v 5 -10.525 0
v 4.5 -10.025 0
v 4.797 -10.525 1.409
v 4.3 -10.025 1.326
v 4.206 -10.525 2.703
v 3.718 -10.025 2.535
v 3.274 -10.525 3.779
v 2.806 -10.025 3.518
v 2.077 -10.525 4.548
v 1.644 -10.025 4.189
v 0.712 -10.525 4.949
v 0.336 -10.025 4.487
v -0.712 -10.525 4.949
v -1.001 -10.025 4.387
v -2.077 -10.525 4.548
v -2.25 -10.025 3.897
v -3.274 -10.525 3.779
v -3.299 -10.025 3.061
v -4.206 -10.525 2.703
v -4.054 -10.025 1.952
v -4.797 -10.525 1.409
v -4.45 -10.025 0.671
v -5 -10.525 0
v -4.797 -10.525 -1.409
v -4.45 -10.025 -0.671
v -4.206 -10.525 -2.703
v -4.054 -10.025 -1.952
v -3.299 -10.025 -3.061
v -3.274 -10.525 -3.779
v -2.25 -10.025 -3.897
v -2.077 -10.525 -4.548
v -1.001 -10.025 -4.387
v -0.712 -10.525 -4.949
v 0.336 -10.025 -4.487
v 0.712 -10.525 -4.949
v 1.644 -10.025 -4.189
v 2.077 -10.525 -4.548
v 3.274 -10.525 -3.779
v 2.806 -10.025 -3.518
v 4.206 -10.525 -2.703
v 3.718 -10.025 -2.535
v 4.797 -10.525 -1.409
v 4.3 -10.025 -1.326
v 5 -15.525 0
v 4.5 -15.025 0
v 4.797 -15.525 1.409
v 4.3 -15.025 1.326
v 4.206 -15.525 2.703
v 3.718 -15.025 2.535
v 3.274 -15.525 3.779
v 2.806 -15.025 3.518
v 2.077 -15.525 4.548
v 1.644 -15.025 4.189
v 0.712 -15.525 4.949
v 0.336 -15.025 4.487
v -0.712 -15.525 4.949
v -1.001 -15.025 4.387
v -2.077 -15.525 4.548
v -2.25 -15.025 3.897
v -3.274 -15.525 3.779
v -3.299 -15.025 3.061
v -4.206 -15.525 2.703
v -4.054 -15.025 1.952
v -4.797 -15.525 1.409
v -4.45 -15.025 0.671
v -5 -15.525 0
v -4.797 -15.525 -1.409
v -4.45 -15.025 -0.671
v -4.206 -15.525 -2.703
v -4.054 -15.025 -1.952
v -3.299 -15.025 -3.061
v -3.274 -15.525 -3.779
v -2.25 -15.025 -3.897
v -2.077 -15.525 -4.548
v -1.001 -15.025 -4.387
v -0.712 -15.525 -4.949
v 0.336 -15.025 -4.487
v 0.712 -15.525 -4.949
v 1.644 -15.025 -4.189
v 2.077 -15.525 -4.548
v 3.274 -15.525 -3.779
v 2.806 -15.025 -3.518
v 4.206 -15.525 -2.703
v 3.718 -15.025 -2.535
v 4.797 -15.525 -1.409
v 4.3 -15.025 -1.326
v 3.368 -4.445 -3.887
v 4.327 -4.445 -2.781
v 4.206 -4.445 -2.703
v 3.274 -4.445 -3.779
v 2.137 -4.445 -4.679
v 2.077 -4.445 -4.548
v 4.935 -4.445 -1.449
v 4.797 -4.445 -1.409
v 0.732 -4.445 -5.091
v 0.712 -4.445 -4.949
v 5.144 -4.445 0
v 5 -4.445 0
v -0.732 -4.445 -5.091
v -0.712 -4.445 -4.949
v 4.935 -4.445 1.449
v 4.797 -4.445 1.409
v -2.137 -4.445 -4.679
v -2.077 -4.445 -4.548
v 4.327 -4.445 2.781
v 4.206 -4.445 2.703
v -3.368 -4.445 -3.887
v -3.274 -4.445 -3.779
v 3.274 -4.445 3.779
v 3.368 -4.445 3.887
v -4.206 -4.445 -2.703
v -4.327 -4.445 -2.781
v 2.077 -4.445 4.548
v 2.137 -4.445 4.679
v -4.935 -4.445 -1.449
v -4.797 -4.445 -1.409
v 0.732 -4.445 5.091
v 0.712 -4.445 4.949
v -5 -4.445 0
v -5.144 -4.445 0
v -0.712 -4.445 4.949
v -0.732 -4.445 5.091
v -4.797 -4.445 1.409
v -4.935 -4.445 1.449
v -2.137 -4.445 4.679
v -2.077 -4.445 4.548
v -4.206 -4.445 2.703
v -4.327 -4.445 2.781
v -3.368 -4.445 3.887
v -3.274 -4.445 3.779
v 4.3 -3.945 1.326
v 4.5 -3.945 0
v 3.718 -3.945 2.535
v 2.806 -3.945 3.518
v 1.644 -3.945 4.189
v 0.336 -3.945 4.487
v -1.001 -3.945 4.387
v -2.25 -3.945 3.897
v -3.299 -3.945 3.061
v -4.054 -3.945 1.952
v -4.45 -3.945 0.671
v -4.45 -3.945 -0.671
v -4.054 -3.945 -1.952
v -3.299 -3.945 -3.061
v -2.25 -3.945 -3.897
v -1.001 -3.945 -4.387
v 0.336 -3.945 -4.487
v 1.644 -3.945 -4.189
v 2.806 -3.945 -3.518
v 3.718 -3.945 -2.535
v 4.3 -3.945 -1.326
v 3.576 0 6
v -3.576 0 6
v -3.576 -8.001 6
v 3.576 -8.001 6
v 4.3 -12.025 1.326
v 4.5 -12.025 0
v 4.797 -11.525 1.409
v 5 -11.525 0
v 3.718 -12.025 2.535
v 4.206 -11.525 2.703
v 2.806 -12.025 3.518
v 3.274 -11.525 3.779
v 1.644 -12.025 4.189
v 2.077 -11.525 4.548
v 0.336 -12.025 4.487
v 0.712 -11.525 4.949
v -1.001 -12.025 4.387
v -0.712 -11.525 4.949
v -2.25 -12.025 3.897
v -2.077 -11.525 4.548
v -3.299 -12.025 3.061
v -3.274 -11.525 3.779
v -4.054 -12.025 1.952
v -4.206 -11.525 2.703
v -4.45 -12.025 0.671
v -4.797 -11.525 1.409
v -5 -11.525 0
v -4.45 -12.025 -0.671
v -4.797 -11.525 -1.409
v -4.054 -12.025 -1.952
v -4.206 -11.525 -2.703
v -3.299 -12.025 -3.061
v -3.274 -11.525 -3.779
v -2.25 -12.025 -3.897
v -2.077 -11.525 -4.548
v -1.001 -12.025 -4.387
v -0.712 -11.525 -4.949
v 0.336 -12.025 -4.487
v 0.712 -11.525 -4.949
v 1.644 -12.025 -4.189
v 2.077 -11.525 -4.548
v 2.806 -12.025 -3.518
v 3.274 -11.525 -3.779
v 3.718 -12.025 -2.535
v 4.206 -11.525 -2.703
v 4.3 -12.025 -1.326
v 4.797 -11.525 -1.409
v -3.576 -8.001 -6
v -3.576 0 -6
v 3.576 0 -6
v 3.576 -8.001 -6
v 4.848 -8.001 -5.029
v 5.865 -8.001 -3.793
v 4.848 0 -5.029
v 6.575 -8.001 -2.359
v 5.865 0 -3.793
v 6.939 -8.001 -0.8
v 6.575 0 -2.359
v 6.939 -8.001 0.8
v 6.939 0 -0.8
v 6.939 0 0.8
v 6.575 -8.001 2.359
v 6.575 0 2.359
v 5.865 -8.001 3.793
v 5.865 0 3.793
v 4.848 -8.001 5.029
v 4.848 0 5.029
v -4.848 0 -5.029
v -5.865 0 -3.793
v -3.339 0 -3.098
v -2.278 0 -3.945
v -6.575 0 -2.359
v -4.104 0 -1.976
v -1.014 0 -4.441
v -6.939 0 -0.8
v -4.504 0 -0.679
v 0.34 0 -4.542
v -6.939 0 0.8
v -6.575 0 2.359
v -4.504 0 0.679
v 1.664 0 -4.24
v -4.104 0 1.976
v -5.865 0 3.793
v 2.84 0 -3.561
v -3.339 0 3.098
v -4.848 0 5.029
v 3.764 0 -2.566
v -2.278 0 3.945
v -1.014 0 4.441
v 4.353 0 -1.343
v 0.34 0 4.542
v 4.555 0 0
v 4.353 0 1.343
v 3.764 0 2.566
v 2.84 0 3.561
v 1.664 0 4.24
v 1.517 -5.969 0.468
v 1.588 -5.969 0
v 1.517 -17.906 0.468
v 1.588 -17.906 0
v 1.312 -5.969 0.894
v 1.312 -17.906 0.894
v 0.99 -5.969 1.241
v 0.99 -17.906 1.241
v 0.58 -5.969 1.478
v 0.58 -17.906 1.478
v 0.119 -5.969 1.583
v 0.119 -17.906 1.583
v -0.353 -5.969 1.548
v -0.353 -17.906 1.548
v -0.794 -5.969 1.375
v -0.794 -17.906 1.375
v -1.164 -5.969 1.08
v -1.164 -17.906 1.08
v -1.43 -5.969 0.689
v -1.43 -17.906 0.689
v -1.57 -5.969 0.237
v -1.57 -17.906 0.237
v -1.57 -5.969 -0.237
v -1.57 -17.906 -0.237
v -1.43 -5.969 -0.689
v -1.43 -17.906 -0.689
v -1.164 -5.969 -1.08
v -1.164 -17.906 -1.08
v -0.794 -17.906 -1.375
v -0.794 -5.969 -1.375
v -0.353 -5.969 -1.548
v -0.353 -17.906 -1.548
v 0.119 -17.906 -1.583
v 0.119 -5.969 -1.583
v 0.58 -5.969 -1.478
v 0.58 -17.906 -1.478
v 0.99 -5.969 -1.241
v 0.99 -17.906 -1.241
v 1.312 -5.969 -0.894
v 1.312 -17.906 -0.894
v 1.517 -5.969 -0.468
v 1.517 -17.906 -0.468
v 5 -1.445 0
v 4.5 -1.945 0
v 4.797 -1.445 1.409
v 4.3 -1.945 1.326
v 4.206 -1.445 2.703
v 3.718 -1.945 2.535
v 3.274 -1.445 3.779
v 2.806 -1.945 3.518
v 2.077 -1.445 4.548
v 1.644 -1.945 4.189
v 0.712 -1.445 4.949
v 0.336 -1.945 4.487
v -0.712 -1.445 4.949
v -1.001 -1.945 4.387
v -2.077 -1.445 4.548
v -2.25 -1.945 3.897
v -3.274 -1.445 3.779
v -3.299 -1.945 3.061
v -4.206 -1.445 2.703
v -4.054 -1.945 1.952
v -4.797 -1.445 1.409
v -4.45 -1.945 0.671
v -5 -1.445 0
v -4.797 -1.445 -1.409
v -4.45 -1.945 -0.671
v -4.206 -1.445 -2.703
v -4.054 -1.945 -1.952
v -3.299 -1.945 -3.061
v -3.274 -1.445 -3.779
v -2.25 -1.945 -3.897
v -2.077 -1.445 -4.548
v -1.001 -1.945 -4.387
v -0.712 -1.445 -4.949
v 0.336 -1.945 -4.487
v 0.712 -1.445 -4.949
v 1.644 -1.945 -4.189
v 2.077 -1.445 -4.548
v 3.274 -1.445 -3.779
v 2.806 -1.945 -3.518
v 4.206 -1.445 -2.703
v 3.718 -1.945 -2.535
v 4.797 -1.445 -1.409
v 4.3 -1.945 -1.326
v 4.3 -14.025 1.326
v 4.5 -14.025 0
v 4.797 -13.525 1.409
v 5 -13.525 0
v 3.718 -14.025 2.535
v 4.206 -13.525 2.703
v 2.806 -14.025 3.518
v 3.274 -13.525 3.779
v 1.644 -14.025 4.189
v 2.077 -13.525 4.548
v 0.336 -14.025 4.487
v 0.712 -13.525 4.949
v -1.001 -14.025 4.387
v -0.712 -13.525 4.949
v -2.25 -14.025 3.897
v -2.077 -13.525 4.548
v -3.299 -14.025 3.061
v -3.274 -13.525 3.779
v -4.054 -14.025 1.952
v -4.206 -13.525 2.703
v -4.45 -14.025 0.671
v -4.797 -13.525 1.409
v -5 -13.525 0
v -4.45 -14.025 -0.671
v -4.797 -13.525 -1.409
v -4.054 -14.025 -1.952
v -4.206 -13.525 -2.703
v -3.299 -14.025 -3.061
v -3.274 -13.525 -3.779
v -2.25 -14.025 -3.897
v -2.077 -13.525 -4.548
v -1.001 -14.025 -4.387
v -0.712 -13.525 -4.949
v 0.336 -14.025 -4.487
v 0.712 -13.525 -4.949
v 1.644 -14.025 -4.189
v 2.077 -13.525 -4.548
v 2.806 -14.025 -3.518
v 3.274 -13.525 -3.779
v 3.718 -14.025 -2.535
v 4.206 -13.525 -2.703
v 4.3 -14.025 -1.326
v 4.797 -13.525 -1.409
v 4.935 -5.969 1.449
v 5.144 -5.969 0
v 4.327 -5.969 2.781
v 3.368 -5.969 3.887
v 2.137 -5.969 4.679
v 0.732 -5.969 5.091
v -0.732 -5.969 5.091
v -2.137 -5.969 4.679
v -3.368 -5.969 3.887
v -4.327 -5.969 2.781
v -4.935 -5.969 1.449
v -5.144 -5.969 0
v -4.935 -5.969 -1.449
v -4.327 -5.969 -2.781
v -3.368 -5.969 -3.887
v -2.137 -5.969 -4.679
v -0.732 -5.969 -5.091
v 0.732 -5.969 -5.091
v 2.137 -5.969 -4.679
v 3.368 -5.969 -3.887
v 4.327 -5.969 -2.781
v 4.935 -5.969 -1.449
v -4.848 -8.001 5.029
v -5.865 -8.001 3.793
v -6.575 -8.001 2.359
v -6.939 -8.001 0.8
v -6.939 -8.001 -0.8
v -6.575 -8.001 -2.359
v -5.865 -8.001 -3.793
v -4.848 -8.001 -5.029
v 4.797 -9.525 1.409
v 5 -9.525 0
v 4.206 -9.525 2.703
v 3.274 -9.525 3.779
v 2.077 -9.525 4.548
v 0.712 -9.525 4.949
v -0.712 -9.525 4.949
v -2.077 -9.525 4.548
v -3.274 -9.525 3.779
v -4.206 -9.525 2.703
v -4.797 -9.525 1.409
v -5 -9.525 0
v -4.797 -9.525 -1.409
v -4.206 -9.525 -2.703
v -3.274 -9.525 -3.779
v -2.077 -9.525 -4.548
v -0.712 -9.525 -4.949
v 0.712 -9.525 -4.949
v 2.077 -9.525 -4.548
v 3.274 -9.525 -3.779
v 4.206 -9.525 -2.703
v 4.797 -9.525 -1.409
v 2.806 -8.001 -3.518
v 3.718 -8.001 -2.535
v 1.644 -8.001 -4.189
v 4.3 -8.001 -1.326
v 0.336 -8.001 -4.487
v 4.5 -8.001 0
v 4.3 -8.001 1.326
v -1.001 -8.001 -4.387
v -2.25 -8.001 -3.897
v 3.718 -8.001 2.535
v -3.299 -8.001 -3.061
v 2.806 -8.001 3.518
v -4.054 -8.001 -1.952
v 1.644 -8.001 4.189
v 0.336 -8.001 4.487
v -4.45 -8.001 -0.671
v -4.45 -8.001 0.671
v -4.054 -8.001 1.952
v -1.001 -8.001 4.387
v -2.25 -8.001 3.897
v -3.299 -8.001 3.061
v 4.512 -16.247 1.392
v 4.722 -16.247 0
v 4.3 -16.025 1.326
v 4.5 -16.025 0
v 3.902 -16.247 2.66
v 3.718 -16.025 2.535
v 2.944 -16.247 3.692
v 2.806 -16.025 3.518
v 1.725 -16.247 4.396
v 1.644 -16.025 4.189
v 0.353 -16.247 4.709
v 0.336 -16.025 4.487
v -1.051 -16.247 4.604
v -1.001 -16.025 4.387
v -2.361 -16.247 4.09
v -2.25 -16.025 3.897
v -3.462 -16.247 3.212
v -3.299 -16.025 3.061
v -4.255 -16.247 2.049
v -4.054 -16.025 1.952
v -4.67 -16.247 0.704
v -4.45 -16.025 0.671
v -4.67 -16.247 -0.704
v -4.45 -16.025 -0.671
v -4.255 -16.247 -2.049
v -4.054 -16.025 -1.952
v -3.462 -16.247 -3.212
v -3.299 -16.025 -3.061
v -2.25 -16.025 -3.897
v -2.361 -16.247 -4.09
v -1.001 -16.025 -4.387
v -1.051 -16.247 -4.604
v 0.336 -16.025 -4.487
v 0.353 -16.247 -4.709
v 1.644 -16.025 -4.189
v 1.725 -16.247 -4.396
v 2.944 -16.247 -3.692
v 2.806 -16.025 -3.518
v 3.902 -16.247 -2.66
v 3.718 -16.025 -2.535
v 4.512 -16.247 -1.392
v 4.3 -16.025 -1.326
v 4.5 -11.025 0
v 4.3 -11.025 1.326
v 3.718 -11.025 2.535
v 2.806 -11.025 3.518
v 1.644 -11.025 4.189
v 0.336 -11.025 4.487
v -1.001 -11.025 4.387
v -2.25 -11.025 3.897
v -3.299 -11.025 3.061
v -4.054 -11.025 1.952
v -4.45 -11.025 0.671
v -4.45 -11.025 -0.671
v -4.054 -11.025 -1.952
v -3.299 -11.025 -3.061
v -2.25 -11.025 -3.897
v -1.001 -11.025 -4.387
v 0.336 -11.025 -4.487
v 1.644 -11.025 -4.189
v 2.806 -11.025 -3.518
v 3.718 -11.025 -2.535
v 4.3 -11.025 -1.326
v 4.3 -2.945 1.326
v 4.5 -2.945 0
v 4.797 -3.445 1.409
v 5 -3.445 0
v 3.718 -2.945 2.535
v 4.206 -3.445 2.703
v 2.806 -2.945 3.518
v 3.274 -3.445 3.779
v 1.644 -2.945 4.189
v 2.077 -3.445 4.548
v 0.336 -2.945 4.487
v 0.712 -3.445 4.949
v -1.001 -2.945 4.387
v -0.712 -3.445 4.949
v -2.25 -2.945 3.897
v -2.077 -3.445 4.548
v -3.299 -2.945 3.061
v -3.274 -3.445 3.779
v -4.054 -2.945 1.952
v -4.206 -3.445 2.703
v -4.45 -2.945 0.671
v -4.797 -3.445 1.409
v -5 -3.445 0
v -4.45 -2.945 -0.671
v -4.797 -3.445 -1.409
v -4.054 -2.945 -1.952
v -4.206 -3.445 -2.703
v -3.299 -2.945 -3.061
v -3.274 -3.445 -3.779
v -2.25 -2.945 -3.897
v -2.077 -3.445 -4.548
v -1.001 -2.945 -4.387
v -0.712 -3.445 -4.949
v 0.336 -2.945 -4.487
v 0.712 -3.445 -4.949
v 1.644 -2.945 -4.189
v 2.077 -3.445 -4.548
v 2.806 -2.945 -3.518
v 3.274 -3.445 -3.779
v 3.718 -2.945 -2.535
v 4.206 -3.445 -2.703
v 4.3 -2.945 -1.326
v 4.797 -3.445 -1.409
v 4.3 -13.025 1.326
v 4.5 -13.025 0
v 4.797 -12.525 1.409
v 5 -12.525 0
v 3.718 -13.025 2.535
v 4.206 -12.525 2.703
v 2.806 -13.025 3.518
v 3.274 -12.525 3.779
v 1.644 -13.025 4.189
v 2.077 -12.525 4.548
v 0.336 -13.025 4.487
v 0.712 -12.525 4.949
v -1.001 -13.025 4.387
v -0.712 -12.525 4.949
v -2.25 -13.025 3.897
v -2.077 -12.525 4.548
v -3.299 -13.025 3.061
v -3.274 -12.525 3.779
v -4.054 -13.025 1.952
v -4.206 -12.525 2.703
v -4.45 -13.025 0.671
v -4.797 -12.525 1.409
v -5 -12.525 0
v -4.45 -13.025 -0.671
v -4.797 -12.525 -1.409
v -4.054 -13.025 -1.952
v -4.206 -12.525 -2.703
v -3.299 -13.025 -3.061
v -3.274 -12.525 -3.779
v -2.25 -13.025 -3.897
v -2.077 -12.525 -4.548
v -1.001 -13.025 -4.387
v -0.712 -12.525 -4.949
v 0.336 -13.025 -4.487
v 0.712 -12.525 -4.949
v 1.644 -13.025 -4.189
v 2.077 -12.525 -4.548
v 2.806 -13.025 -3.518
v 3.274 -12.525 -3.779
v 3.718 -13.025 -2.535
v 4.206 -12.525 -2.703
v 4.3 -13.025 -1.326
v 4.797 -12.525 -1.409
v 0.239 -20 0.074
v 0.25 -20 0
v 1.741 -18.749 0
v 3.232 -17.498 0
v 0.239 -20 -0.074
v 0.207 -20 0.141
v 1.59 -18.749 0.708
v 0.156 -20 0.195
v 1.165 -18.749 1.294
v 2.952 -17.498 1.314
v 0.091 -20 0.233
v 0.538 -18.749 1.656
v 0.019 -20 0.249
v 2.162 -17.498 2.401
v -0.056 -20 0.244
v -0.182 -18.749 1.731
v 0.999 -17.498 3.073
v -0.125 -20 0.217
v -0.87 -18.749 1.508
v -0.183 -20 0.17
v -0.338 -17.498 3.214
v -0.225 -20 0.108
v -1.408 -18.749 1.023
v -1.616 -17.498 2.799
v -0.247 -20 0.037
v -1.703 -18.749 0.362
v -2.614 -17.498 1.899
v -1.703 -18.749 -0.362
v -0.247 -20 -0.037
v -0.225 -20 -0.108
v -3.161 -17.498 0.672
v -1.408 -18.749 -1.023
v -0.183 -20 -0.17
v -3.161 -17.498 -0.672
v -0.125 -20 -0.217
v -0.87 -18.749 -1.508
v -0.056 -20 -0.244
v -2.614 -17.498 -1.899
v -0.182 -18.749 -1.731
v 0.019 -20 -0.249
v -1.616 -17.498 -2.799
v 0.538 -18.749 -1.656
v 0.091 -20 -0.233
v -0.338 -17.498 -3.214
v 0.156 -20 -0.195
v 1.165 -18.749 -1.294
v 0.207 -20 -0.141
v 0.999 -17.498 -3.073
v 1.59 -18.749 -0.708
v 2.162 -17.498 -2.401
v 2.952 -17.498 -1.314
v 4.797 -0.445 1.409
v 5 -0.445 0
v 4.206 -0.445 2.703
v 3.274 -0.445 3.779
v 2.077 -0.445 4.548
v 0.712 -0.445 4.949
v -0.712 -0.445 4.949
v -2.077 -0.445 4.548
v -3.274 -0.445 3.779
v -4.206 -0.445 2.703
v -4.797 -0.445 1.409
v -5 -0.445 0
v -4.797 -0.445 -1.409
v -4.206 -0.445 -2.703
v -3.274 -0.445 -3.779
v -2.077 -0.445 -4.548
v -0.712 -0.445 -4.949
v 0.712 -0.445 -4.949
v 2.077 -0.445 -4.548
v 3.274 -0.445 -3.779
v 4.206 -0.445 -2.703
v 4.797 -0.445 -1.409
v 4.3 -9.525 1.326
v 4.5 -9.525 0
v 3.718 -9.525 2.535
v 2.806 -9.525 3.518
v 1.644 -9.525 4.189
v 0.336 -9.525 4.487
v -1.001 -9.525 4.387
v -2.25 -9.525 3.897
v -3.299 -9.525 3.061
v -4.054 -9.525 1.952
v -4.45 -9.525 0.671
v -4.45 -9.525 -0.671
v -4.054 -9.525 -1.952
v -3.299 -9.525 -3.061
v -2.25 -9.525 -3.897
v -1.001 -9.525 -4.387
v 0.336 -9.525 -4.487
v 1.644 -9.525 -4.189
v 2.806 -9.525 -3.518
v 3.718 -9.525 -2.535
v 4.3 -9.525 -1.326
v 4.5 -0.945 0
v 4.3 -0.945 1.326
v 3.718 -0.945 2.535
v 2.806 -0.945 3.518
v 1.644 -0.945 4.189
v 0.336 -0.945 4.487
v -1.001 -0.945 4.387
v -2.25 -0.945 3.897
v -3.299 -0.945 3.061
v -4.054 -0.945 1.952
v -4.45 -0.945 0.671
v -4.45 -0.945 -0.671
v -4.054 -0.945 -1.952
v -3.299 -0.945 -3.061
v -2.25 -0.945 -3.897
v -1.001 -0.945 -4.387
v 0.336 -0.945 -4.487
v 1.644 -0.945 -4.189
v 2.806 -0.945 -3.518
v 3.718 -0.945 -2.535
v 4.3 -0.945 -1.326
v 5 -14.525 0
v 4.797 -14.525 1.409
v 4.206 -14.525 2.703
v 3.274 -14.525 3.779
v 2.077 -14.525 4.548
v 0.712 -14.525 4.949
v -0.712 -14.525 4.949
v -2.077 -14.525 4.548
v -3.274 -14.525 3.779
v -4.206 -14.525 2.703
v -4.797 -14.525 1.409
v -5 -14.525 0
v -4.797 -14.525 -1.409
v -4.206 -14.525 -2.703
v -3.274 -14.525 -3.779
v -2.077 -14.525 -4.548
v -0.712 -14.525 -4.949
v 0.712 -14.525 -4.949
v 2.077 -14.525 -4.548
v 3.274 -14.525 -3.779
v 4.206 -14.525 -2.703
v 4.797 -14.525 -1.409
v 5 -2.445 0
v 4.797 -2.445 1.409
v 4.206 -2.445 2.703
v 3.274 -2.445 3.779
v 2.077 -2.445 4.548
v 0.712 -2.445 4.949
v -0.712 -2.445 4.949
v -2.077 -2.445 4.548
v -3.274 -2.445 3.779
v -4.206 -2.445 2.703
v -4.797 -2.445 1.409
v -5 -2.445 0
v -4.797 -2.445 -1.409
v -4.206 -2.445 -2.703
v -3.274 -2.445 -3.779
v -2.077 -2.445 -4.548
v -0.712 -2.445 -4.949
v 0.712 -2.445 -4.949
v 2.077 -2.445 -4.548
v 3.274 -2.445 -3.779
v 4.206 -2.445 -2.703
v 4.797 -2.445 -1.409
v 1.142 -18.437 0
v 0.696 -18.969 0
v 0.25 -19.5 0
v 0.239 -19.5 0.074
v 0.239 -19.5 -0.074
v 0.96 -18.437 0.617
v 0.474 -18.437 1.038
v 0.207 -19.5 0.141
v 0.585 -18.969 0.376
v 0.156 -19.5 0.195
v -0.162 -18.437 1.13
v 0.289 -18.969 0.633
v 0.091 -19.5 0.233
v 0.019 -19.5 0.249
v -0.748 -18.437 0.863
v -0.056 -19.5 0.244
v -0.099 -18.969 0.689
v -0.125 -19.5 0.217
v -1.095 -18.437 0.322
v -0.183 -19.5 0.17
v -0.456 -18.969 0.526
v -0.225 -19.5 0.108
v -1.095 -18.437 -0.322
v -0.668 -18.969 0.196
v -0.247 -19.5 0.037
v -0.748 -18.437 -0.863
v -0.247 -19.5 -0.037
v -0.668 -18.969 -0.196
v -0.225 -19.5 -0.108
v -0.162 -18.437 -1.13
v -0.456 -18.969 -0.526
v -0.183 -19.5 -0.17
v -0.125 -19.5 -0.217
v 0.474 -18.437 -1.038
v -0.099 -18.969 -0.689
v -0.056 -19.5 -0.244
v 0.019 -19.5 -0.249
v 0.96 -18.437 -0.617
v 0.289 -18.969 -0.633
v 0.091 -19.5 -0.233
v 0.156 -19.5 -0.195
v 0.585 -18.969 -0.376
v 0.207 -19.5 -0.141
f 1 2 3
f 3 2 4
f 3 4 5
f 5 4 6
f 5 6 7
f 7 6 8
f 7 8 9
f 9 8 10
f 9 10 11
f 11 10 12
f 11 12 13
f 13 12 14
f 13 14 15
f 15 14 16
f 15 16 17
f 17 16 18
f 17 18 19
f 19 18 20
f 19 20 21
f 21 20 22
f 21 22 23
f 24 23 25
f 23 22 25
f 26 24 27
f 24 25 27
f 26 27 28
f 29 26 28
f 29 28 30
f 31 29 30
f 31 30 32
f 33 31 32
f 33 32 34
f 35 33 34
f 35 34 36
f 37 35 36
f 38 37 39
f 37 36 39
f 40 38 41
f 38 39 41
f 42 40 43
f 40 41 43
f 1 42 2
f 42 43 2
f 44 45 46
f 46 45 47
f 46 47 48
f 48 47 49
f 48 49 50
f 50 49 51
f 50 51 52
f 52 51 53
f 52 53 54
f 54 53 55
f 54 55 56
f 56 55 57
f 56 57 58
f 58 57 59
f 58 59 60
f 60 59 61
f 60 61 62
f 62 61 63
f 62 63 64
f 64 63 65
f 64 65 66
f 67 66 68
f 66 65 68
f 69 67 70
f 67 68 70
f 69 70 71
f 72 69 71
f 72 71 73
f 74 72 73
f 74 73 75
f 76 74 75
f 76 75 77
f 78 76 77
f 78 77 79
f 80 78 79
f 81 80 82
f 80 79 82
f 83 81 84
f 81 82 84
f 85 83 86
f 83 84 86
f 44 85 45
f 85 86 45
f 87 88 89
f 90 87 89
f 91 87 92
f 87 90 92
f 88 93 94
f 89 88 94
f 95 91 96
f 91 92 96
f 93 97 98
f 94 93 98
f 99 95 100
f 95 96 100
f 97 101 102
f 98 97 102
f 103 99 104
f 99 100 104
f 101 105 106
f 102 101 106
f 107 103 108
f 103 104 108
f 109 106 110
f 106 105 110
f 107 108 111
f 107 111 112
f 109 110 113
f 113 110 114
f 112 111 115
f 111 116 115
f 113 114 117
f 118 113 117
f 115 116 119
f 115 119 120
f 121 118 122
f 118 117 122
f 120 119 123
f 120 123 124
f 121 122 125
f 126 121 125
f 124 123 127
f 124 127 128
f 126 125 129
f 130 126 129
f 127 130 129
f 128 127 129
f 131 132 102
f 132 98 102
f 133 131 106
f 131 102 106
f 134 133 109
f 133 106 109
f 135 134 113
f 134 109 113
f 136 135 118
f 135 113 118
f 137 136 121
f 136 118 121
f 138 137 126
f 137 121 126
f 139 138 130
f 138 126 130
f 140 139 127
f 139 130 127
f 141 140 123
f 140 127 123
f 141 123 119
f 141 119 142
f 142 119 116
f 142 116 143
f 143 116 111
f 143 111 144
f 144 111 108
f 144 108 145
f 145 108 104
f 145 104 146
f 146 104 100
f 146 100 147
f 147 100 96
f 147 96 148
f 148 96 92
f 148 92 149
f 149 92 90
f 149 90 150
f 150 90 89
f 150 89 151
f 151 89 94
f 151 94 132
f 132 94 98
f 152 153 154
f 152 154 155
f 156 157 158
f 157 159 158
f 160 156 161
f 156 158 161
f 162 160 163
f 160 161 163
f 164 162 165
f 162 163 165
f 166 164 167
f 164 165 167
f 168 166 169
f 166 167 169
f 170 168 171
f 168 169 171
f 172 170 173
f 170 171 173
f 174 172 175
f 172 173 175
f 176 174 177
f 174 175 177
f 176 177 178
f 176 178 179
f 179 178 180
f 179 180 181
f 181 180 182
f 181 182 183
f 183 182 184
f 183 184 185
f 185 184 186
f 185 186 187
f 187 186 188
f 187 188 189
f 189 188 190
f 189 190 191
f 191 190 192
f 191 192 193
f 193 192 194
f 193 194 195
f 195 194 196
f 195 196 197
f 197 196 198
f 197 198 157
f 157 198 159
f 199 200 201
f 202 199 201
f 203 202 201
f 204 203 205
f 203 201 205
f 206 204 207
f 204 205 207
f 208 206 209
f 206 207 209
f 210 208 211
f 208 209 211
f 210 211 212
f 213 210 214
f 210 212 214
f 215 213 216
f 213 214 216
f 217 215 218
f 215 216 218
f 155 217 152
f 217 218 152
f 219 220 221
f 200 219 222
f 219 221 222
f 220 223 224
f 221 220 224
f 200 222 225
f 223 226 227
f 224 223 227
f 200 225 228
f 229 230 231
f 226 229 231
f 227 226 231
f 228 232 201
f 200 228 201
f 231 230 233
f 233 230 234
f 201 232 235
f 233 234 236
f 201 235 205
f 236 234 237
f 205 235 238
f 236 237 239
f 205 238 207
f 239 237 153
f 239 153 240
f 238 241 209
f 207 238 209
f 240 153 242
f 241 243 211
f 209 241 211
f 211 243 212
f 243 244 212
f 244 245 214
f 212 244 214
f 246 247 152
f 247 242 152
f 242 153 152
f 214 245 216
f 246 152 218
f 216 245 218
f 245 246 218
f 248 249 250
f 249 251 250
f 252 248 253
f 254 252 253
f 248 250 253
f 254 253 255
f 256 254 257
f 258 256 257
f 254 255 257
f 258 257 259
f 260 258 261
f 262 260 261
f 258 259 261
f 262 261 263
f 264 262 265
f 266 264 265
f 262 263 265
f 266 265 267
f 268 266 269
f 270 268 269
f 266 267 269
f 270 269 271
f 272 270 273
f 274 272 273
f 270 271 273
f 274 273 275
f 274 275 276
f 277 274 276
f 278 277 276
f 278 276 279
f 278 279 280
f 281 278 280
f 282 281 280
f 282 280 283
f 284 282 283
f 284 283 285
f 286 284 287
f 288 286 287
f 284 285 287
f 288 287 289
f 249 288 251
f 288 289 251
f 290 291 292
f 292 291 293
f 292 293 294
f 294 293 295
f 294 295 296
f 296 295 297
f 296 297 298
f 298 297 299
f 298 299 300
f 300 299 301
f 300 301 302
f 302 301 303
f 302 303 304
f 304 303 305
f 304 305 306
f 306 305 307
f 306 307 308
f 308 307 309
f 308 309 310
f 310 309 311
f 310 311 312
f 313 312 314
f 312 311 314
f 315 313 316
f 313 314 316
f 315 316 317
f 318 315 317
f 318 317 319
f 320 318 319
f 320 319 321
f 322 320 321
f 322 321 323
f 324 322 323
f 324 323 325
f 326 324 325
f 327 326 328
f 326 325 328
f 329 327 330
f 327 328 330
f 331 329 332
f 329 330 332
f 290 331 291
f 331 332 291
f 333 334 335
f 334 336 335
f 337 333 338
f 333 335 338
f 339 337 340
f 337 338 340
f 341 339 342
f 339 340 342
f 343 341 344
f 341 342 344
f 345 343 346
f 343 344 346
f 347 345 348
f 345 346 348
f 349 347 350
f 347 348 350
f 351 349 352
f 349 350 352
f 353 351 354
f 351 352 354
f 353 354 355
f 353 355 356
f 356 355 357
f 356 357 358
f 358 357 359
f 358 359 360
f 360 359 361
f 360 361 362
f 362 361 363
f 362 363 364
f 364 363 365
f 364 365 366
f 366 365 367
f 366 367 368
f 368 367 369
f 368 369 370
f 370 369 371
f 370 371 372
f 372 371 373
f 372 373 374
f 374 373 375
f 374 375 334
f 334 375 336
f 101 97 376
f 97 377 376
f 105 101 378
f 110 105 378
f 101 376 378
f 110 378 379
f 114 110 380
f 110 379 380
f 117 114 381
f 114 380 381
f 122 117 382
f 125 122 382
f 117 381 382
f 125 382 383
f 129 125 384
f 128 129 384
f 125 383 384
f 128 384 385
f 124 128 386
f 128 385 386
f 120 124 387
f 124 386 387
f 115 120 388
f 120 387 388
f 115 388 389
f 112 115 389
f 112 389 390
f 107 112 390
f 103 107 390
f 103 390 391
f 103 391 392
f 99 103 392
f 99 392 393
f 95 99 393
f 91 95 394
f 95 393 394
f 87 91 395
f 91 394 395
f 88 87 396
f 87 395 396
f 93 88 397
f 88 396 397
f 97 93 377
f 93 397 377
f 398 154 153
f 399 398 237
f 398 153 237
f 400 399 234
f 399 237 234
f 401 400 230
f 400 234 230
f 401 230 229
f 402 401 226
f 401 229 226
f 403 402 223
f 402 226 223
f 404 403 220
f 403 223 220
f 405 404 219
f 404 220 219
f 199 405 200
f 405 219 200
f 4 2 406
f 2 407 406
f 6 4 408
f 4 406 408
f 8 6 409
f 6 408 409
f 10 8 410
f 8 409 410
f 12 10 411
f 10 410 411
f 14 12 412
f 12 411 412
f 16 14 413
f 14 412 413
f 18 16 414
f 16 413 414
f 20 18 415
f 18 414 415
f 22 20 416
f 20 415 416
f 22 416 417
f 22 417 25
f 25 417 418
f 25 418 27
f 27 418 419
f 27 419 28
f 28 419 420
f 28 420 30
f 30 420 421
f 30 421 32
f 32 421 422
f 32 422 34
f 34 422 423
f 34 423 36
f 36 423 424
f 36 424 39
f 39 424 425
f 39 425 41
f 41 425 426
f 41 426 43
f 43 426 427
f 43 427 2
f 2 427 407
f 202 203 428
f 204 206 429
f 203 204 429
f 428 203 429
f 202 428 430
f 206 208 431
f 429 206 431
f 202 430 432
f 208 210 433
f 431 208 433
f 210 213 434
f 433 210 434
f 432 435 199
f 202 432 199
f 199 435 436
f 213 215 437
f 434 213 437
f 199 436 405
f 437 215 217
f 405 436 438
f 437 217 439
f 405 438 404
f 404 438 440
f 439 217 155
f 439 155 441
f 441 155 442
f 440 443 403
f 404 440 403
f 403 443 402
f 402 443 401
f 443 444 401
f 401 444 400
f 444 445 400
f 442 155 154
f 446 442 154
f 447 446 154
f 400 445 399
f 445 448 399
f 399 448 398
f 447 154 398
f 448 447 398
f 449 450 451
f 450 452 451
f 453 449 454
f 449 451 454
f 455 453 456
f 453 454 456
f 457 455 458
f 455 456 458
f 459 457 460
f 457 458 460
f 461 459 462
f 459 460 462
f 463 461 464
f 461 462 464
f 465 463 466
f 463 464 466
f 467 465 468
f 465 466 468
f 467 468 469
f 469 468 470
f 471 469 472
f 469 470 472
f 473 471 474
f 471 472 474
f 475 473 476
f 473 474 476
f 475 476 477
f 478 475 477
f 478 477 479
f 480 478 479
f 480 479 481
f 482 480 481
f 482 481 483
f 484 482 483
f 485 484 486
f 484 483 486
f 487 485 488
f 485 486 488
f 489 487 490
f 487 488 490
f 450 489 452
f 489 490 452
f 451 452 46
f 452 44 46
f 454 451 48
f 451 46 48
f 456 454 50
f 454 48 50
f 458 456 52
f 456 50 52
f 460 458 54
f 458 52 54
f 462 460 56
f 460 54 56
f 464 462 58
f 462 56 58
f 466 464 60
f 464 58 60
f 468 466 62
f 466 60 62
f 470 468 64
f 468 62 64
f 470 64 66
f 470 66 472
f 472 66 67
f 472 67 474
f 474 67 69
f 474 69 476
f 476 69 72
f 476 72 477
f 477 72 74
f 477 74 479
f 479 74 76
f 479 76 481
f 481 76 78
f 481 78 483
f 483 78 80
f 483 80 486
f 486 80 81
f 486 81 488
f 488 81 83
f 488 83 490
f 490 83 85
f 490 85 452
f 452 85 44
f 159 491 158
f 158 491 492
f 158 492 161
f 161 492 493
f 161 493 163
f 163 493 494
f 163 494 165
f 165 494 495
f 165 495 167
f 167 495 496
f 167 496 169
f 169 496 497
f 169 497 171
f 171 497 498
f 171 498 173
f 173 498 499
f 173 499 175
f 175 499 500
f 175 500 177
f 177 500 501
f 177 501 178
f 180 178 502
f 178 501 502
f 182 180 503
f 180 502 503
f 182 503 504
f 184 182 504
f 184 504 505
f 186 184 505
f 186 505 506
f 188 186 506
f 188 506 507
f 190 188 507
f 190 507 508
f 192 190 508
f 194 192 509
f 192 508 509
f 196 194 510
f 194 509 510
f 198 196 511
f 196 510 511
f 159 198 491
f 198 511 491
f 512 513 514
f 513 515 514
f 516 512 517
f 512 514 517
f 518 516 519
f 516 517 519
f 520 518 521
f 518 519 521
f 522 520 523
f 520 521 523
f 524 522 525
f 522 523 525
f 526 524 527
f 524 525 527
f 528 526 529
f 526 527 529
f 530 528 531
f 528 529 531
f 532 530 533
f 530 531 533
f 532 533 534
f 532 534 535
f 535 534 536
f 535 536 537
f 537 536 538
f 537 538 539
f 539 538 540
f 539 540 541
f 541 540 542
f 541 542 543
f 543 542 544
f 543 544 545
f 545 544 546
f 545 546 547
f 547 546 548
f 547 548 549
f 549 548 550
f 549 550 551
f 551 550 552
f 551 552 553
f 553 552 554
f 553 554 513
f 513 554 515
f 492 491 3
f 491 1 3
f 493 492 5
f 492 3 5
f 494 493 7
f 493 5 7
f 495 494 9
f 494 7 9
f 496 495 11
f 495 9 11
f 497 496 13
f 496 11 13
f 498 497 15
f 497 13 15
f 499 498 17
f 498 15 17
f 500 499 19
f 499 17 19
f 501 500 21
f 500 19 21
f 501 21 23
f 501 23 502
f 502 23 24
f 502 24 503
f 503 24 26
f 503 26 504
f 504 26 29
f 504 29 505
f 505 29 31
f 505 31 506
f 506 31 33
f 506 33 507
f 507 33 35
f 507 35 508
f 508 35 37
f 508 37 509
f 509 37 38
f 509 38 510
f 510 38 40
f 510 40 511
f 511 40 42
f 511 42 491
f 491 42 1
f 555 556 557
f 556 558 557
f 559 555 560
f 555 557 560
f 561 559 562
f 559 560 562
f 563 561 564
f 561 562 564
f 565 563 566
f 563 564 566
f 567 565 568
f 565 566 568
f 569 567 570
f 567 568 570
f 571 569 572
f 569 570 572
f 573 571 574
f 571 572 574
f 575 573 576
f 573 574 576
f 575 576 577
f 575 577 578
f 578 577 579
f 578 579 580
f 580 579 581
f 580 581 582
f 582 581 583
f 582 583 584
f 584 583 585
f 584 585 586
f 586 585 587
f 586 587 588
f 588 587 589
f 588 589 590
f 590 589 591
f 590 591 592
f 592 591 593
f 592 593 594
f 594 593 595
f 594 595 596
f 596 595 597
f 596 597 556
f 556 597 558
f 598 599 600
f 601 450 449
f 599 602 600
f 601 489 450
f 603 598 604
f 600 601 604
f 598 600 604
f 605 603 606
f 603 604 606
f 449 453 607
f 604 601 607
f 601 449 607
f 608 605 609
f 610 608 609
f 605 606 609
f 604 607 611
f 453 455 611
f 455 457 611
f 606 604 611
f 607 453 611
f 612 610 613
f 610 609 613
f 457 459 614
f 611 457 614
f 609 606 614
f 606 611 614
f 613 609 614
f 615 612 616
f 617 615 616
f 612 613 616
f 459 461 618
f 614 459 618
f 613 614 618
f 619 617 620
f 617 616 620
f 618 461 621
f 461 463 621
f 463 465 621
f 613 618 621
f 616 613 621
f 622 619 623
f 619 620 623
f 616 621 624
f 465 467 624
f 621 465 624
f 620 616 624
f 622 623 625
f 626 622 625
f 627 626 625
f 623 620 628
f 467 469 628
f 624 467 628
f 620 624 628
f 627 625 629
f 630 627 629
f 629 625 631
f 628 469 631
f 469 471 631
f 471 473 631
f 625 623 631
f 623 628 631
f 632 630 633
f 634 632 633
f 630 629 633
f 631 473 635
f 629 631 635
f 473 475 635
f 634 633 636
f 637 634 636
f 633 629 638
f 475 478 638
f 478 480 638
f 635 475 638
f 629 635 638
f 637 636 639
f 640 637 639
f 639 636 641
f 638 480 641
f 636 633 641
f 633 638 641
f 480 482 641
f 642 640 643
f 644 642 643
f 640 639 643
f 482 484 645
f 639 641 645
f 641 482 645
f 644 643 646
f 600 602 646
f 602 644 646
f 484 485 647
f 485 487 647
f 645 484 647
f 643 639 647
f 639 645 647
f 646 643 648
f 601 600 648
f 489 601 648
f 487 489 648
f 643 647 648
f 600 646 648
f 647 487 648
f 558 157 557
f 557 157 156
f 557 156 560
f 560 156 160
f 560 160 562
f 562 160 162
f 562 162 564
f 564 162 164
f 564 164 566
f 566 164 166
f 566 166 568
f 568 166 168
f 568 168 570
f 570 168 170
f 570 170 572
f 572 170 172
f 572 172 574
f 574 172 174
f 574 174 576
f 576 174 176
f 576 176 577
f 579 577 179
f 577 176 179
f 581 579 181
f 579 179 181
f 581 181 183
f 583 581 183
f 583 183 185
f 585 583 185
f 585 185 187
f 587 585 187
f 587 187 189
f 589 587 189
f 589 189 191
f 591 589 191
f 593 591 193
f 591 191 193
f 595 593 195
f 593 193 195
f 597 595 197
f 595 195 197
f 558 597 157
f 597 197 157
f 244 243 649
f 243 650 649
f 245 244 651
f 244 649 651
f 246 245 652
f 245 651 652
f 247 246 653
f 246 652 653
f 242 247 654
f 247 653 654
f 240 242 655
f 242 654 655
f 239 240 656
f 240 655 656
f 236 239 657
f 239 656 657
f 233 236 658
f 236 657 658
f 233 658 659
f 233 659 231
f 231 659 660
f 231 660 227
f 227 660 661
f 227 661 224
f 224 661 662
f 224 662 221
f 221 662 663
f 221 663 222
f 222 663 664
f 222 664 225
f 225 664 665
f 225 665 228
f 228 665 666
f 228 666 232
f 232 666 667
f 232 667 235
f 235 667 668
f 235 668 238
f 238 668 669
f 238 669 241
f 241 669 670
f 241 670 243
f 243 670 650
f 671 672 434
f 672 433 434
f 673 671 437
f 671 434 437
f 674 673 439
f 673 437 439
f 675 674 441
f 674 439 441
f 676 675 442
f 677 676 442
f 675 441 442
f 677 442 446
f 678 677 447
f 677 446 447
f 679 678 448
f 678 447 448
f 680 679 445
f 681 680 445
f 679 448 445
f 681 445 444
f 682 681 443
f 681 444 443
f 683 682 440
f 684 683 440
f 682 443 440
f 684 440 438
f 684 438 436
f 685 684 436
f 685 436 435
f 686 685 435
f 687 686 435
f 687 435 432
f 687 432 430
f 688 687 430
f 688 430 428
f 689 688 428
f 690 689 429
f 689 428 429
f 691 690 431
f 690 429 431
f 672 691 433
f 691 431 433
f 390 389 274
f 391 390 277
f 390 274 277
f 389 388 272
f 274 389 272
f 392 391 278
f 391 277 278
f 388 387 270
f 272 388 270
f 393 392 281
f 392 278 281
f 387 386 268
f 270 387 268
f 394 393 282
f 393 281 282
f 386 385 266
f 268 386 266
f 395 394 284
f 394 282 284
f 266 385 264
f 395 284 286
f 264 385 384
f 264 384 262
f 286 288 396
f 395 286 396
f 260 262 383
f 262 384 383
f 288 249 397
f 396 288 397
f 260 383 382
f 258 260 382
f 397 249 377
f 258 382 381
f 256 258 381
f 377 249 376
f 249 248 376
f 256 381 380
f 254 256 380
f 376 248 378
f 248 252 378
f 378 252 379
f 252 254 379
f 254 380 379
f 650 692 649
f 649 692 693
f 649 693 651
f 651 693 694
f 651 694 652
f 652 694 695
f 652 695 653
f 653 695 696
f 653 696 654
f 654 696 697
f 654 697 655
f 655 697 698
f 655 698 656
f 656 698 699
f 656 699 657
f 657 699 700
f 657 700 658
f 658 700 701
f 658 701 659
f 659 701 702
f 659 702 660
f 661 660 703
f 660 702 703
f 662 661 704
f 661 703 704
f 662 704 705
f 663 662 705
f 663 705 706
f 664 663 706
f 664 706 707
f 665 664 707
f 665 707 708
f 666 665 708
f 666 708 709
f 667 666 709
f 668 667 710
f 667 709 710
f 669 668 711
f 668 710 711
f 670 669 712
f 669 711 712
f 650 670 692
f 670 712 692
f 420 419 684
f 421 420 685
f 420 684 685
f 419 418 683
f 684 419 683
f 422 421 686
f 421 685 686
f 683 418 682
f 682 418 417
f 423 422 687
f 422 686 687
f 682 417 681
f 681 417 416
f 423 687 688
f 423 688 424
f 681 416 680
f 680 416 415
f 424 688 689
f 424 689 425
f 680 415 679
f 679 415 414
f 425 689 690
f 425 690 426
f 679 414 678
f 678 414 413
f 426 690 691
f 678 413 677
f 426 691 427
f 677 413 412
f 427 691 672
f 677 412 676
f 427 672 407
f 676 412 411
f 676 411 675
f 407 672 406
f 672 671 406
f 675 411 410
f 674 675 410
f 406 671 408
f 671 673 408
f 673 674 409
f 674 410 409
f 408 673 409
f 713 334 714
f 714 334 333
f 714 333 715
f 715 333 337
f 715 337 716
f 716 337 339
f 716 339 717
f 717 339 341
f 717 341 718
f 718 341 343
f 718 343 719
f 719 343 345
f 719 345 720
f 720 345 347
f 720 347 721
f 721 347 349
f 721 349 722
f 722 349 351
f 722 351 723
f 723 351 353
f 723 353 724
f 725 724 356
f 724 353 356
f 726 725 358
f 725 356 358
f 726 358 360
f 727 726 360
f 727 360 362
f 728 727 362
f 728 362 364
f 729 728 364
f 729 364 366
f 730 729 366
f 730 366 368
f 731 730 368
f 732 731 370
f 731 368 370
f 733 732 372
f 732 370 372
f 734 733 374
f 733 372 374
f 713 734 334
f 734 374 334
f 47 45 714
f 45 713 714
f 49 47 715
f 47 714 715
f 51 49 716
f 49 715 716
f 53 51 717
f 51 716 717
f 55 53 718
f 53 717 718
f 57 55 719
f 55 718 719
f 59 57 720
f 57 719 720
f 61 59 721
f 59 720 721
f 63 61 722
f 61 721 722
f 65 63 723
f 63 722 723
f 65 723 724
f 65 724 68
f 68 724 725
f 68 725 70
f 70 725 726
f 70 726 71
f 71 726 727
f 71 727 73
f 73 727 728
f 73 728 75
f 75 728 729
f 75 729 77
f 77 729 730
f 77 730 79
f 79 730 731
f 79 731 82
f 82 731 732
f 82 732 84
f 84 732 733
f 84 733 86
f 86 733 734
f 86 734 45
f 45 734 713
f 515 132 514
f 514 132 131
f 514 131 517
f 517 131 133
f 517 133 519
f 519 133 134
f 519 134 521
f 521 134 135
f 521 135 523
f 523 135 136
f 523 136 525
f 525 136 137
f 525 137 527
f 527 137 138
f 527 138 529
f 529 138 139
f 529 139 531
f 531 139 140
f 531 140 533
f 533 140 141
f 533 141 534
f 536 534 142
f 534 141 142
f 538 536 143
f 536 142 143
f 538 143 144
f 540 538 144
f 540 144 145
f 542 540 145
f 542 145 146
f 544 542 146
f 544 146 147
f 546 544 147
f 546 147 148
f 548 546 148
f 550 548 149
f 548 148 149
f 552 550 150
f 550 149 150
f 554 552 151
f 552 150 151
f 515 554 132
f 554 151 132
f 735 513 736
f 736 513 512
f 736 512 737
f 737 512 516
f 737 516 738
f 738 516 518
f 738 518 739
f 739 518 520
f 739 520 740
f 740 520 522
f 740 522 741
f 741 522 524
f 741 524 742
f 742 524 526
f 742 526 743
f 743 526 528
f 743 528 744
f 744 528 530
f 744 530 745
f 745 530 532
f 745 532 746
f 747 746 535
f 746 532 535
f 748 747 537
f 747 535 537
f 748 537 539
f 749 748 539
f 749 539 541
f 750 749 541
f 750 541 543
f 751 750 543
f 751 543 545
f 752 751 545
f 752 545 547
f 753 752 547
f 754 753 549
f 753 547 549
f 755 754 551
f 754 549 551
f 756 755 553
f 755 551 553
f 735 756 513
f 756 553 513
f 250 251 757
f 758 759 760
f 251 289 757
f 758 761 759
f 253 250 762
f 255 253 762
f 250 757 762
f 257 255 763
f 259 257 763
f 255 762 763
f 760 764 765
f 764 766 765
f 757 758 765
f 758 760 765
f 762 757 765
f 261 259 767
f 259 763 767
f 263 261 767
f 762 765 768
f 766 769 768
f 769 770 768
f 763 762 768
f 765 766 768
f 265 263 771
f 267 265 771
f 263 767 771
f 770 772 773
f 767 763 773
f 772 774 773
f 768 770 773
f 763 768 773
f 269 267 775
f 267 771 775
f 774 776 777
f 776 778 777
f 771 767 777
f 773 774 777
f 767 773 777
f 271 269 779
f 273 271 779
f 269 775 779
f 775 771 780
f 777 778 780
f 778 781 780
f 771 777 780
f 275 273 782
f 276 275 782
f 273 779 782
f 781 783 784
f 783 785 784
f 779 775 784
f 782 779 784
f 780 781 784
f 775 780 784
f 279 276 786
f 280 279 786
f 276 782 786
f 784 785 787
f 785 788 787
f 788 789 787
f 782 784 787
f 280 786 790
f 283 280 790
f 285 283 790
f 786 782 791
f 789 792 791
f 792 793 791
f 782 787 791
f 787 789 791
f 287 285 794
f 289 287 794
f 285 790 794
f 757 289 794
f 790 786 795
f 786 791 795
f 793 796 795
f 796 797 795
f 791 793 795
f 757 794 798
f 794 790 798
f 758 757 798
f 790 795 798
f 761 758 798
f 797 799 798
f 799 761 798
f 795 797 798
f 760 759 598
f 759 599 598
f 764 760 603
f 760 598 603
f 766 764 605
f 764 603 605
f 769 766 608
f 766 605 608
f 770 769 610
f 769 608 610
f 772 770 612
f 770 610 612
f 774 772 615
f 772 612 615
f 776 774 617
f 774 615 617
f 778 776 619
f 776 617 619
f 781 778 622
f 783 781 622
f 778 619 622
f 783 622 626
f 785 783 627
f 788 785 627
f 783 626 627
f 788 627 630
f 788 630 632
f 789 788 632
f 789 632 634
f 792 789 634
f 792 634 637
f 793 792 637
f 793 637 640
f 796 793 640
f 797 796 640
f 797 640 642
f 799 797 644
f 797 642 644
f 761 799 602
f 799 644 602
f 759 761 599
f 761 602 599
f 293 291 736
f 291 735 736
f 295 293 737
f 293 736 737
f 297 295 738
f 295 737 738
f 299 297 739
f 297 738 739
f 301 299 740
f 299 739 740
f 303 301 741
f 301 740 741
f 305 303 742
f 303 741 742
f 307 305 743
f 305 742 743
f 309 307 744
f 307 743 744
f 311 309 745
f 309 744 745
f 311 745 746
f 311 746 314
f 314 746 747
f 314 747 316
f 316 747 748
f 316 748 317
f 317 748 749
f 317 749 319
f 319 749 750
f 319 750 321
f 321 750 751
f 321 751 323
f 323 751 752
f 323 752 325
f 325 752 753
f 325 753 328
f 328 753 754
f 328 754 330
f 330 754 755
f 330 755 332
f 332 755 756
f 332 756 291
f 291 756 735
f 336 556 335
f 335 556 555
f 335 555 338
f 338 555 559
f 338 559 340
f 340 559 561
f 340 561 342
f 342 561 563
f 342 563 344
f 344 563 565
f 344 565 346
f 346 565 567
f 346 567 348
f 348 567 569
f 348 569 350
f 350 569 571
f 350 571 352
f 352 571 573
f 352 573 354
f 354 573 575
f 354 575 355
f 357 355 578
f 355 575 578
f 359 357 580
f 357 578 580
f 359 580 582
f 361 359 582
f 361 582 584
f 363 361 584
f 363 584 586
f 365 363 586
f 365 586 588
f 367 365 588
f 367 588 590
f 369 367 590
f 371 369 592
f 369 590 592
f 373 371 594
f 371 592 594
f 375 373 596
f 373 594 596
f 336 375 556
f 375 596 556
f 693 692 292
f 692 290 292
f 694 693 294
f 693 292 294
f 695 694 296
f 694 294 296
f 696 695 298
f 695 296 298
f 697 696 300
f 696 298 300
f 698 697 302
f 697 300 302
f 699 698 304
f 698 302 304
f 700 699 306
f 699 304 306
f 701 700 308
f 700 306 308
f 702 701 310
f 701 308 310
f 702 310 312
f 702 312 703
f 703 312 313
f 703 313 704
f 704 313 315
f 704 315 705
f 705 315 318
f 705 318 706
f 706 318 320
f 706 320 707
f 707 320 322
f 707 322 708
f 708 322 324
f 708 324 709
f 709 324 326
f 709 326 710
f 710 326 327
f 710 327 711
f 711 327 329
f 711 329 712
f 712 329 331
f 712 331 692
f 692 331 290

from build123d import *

# Parameters (mm, degrees)
SKETCH2_OUTSIDE_W   = 21.592
SKETCH2_OUTSIDE_H   = 21.592
SKETCH2_OUTSIDE_W_2 = 21.785609725
SKETCH2_OUTSIDE_H_2 = 12
CUT_EXTRUDE1_DEPTH  = 21


with BuildPart() as part:
    # Sketch1 → Revolve1 (revolve)
    with BuildSketch(Plane.XY):
        Polygon((5.1435, -5.969), (1.5875, -5.969), (1.5875, -17.90602957), (0.25, -19.5), (0.25, -20), (4.722297129, -16.247297129), (4.5, -16.025), (5, -15.525), (4.5, -15.025), (5, -14.525), (4.5, -14.025), (5, -13.525), (4.5, -13.025), (5, -12.525), (4.5, -12.025), (5, -11.525), (4.5, -11.025), (5, -10.525), (4.5, -10.025), (5, -9.525), (4.5, -9.525), (4.5, -8.001), (6.985, -8.001), (6.985, 0), (4.555, 0), (5, -0.445), (4.5, -0.945), (5, -1.445), (4.5, -1.945), (5, -2.445), (4.5, -2.945), (5, -3.445), (4.5, -3.945), (5, -4.445), (5.1435, -4.445), align=None)
    revolve(axis=Axis((0, 0, 0), (0, -1, 0)))

    # Sketch2 outside → Cut-Extrude1 (cut, through all)
    with BuildSketch(Plane(origin=(0, 0, 0), x_dir=(1, 0, 0), z_dir=(0, 1, 0))):
        Rectangle(SKETCH2_OUTSIDE_W, SKETCH2_OUTSIDE_H)
        with Locations((0.61693762, 0)):
            Rectangle(SKETCH2_OUTSIDE_W_2, SKETCH2_OUTSIDE_H_2, mode=Mode.SUBTRACT)
    extrude(amount=-CUT_EXTRUDE1_DEPTH, mode=Mode.SUBTRACT)


solid = part.part
